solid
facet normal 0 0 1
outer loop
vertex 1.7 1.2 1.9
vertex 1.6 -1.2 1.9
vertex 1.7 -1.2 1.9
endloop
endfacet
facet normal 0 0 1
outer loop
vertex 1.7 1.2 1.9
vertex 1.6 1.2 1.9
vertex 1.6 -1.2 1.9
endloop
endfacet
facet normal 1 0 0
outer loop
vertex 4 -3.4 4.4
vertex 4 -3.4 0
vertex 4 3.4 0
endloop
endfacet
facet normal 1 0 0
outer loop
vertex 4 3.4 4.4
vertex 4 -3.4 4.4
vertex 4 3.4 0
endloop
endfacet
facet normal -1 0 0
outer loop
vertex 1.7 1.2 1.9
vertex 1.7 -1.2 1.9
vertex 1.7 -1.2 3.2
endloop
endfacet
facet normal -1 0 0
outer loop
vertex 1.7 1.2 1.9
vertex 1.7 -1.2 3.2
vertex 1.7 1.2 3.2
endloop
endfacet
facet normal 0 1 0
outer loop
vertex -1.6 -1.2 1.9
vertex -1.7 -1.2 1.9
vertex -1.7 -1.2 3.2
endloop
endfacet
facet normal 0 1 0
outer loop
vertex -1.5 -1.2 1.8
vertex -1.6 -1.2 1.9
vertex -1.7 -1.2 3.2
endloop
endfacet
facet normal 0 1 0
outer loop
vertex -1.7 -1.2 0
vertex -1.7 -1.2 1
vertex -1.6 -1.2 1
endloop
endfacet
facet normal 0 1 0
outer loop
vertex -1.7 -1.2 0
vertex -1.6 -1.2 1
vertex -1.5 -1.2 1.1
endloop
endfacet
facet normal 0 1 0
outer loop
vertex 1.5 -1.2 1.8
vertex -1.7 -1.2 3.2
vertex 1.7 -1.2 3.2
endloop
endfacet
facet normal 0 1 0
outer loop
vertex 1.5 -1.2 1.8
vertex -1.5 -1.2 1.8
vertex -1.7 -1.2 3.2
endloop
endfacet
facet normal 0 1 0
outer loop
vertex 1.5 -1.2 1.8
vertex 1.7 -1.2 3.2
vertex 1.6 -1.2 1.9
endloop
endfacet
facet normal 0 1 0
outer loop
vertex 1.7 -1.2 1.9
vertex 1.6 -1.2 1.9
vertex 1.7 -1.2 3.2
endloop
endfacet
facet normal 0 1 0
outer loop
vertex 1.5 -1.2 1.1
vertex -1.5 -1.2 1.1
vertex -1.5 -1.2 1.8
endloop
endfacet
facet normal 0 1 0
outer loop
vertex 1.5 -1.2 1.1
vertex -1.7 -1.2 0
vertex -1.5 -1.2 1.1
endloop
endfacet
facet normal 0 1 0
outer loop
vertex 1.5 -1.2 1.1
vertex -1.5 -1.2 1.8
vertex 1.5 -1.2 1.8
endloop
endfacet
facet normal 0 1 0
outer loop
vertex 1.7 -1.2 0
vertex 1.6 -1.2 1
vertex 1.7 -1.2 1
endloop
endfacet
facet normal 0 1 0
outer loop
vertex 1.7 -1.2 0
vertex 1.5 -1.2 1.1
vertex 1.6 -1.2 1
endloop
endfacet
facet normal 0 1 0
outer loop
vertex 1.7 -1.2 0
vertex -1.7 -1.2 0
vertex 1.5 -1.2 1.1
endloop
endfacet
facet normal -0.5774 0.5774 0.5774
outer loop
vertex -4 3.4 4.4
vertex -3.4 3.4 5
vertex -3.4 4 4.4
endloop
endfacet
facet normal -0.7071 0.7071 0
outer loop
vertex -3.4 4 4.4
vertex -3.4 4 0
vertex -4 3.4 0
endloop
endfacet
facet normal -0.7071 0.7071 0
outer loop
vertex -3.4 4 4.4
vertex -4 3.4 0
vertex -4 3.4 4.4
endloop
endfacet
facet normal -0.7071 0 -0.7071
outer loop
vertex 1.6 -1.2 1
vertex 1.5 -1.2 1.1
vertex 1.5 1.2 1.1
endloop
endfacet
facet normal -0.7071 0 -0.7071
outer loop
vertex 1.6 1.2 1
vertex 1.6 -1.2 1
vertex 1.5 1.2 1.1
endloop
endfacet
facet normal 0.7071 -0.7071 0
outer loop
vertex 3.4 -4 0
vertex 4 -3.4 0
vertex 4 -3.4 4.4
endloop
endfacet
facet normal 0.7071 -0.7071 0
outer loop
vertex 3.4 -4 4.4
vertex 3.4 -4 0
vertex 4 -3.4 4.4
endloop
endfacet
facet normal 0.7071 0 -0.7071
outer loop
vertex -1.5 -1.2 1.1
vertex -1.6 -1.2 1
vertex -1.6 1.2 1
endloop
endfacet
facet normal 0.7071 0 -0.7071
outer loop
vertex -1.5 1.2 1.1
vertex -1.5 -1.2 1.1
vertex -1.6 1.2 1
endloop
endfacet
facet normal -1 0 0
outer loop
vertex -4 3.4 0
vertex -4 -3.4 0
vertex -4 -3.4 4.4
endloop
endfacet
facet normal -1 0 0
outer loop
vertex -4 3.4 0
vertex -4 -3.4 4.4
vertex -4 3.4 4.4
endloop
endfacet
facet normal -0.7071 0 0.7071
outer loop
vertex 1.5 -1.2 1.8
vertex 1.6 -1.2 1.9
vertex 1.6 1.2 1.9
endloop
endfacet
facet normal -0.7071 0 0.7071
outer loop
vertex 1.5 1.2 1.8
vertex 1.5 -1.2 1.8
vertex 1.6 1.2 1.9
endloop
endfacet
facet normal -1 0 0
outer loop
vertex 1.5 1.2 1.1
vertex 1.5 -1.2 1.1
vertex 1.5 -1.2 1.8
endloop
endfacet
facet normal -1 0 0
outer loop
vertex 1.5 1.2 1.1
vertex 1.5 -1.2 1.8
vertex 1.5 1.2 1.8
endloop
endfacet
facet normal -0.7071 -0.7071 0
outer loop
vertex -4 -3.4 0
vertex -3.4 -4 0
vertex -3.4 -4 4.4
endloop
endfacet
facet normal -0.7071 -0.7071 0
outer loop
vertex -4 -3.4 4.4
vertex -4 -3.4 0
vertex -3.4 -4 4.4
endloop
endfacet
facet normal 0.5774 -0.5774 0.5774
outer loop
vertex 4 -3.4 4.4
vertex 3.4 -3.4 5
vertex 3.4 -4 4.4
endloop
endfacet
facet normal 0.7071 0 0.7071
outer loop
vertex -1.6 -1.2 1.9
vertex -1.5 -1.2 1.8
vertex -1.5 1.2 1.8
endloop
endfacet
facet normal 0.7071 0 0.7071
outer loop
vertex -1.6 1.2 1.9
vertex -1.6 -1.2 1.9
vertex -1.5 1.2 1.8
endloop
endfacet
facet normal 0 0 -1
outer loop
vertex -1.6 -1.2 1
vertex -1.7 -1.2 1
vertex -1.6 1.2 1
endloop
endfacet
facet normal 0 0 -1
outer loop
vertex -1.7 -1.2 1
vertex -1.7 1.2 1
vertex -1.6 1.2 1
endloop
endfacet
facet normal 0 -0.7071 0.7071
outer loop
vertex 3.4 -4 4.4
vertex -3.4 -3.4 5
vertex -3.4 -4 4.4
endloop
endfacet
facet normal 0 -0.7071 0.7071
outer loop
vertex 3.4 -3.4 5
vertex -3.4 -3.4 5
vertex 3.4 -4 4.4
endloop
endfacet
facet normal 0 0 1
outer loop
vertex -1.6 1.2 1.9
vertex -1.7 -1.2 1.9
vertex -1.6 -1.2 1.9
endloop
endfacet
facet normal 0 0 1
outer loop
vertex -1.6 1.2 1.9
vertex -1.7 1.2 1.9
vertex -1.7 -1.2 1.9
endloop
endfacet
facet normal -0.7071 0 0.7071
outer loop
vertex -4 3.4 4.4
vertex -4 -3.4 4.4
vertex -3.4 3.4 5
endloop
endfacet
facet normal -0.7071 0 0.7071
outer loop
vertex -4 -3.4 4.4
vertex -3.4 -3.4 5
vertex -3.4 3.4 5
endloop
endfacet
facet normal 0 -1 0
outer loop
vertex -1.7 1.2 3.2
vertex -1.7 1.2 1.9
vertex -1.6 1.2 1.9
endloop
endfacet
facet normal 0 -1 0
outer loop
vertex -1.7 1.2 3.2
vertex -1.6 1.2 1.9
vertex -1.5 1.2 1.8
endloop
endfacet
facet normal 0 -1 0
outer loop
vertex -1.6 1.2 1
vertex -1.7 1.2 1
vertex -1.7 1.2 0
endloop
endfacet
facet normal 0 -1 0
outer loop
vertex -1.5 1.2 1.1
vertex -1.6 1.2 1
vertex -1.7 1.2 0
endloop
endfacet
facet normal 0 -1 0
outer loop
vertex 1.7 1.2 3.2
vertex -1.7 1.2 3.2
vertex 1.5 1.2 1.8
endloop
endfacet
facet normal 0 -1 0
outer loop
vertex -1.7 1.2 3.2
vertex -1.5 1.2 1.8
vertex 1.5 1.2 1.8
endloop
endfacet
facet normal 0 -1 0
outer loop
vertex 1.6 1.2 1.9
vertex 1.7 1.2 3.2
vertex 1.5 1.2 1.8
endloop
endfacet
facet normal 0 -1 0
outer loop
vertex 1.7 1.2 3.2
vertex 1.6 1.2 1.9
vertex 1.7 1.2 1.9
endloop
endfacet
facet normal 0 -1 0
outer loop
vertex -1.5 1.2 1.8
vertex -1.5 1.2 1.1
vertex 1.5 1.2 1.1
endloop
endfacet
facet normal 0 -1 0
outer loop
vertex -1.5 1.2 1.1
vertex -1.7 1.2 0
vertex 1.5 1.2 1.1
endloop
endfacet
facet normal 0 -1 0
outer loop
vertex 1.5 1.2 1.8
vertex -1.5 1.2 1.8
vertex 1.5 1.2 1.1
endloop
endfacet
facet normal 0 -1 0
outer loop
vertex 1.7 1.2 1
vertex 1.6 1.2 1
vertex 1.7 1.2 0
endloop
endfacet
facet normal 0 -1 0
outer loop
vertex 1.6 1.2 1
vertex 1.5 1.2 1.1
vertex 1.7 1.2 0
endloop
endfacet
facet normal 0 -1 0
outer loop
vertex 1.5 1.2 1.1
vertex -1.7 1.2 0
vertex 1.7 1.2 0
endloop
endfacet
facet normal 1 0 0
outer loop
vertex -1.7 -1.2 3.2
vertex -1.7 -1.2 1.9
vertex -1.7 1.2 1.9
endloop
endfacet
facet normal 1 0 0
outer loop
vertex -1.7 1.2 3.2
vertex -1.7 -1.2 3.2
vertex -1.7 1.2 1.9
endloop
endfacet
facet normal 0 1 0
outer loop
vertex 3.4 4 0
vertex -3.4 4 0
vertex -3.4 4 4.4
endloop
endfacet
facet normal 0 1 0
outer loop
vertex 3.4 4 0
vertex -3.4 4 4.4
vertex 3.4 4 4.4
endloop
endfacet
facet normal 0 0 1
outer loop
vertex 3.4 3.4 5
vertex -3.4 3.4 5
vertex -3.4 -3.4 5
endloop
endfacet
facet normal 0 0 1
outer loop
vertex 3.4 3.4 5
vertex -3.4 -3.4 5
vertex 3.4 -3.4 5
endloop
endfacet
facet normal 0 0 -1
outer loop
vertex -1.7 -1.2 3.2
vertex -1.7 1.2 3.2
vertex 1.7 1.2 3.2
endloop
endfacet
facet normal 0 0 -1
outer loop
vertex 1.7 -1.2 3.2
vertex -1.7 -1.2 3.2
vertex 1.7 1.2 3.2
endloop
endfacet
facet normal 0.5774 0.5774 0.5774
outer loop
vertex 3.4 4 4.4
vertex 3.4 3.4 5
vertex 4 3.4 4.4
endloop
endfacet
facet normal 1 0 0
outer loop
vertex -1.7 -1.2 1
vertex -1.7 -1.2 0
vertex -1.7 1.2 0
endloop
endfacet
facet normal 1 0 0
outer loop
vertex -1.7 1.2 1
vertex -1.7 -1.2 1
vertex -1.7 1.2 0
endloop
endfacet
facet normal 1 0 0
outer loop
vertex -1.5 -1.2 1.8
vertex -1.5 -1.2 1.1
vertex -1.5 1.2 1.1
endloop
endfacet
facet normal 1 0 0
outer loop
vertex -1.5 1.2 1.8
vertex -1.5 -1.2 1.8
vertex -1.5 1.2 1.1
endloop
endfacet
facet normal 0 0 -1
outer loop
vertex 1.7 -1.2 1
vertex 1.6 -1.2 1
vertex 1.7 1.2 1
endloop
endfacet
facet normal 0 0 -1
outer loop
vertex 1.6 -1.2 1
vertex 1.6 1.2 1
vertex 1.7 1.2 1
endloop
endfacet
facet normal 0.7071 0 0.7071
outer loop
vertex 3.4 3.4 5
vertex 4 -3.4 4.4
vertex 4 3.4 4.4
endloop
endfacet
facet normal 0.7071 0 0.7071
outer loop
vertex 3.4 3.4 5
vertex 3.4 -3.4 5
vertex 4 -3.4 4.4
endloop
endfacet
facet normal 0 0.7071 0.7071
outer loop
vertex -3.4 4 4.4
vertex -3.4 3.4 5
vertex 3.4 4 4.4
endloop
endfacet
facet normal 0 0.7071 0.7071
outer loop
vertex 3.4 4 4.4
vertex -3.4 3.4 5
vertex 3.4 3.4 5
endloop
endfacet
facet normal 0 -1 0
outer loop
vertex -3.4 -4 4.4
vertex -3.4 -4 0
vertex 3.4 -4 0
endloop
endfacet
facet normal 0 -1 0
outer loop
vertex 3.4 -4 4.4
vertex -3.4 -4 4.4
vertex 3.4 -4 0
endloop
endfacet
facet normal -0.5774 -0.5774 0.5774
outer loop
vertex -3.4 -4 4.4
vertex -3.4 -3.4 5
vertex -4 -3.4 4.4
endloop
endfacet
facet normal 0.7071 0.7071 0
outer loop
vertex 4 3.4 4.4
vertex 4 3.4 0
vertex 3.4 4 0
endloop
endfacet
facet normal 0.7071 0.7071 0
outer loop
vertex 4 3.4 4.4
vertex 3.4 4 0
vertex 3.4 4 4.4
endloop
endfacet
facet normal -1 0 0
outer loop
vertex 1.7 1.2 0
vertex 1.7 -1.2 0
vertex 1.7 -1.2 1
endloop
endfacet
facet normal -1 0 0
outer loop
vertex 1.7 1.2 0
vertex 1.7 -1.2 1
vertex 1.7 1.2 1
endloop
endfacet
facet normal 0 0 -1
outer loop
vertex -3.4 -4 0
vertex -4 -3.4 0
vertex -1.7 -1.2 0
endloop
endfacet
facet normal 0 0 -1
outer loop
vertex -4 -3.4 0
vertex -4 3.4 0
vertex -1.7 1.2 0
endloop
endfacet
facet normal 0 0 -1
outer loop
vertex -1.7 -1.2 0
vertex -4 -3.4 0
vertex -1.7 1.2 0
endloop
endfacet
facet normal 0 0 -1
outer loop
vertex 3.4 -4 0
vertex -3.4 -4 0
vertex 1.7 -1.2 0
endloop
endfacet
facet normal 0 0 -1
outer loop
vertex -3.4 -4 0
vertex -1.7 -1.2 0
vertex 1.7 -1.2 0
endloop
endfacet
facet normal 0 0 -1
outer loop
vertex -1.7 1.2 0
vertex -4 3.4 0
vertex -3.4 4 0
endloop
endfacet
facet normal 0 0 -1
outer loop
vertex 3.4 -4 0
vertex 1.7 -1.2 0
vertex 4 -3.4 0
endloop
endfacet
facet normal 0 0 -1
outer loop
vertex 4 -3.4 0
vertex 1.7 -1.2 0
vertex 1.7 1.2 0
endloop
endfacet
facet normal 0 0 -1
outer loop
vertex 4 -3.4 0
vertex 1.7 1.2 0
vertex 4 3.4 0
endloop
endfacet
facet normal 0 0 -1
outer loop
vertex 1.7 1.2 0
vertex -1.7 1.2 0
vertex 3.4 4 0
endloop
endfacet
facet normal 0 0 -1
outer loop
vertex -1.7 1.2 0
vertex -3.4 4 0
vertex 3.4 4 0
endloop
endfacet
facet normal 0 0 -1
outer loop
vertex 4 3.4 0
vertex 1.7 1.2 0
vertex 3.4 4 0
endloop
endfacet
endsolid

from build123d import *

# Parameters (mm, degrees)
F0_W     = 8
F0_H     = 8
F1_DEPTH = 5
F2_W     = 3.4
F2_H     = 2.4
F3_DEPTH = 3.2
F5_W     = 0.2
F5_H     = 2.4
F6_DEPTH = 0.9
F7_SIZE  = 0.1
F8_SIZE  = 0.6


with BuildPart() as f1:
    # F0 (on Top) → F1 (new body)
    with BuildSketch(Plane.XY):
        Rectangle(F0_W, F0_H)
    extrude(amount=F1_DEPTH)

    # F2 (on Top) → F3 (cut)
    with BuildSketch(Plane.XY):
        Rectangle(F2_W, F2_H)
    extrude(amount=F3_DEPTH, mode=Mode.SUBTRACT)

    # F5 (on offset) → F6 (join)
    with BuildSketch(Plane.XY.offset(1)):
        with Locations((-1.6, 0)):
            Rectangle(F5_W, F5_H)
        with Locations((1.6, 0)):
            Rectangle(F5_W, F5_H)
    extrude(amount=F6_DEPTH)

    # F7
    f7_edges = [f1.edges().sort_by_distance(p)[0] for p in [
        (-1.5, 0, 1),
        (-1.5, 0, 1.9),
        (1.5, 0, 1),
        (1.5, 0, 1.9),
    ]]
    chamfer(f7_edges, length=F7_SIZE)

    # F8
    f8_edges = [f1.edges().sort_by_distance(p)[0] for p in [
        (4, 0, 5),
        (-4, 0, 5),
        (0, -4, 5),
        (0, 4, 5),
        (4, -4, 2.5),
        (4, 4, 2.5),
        (-4, -4, 2.5),
        (-4, 4, 2.5),
    ]]
    chamfer(f8_edges, length=F8_SIZE)


solid = f1.part
